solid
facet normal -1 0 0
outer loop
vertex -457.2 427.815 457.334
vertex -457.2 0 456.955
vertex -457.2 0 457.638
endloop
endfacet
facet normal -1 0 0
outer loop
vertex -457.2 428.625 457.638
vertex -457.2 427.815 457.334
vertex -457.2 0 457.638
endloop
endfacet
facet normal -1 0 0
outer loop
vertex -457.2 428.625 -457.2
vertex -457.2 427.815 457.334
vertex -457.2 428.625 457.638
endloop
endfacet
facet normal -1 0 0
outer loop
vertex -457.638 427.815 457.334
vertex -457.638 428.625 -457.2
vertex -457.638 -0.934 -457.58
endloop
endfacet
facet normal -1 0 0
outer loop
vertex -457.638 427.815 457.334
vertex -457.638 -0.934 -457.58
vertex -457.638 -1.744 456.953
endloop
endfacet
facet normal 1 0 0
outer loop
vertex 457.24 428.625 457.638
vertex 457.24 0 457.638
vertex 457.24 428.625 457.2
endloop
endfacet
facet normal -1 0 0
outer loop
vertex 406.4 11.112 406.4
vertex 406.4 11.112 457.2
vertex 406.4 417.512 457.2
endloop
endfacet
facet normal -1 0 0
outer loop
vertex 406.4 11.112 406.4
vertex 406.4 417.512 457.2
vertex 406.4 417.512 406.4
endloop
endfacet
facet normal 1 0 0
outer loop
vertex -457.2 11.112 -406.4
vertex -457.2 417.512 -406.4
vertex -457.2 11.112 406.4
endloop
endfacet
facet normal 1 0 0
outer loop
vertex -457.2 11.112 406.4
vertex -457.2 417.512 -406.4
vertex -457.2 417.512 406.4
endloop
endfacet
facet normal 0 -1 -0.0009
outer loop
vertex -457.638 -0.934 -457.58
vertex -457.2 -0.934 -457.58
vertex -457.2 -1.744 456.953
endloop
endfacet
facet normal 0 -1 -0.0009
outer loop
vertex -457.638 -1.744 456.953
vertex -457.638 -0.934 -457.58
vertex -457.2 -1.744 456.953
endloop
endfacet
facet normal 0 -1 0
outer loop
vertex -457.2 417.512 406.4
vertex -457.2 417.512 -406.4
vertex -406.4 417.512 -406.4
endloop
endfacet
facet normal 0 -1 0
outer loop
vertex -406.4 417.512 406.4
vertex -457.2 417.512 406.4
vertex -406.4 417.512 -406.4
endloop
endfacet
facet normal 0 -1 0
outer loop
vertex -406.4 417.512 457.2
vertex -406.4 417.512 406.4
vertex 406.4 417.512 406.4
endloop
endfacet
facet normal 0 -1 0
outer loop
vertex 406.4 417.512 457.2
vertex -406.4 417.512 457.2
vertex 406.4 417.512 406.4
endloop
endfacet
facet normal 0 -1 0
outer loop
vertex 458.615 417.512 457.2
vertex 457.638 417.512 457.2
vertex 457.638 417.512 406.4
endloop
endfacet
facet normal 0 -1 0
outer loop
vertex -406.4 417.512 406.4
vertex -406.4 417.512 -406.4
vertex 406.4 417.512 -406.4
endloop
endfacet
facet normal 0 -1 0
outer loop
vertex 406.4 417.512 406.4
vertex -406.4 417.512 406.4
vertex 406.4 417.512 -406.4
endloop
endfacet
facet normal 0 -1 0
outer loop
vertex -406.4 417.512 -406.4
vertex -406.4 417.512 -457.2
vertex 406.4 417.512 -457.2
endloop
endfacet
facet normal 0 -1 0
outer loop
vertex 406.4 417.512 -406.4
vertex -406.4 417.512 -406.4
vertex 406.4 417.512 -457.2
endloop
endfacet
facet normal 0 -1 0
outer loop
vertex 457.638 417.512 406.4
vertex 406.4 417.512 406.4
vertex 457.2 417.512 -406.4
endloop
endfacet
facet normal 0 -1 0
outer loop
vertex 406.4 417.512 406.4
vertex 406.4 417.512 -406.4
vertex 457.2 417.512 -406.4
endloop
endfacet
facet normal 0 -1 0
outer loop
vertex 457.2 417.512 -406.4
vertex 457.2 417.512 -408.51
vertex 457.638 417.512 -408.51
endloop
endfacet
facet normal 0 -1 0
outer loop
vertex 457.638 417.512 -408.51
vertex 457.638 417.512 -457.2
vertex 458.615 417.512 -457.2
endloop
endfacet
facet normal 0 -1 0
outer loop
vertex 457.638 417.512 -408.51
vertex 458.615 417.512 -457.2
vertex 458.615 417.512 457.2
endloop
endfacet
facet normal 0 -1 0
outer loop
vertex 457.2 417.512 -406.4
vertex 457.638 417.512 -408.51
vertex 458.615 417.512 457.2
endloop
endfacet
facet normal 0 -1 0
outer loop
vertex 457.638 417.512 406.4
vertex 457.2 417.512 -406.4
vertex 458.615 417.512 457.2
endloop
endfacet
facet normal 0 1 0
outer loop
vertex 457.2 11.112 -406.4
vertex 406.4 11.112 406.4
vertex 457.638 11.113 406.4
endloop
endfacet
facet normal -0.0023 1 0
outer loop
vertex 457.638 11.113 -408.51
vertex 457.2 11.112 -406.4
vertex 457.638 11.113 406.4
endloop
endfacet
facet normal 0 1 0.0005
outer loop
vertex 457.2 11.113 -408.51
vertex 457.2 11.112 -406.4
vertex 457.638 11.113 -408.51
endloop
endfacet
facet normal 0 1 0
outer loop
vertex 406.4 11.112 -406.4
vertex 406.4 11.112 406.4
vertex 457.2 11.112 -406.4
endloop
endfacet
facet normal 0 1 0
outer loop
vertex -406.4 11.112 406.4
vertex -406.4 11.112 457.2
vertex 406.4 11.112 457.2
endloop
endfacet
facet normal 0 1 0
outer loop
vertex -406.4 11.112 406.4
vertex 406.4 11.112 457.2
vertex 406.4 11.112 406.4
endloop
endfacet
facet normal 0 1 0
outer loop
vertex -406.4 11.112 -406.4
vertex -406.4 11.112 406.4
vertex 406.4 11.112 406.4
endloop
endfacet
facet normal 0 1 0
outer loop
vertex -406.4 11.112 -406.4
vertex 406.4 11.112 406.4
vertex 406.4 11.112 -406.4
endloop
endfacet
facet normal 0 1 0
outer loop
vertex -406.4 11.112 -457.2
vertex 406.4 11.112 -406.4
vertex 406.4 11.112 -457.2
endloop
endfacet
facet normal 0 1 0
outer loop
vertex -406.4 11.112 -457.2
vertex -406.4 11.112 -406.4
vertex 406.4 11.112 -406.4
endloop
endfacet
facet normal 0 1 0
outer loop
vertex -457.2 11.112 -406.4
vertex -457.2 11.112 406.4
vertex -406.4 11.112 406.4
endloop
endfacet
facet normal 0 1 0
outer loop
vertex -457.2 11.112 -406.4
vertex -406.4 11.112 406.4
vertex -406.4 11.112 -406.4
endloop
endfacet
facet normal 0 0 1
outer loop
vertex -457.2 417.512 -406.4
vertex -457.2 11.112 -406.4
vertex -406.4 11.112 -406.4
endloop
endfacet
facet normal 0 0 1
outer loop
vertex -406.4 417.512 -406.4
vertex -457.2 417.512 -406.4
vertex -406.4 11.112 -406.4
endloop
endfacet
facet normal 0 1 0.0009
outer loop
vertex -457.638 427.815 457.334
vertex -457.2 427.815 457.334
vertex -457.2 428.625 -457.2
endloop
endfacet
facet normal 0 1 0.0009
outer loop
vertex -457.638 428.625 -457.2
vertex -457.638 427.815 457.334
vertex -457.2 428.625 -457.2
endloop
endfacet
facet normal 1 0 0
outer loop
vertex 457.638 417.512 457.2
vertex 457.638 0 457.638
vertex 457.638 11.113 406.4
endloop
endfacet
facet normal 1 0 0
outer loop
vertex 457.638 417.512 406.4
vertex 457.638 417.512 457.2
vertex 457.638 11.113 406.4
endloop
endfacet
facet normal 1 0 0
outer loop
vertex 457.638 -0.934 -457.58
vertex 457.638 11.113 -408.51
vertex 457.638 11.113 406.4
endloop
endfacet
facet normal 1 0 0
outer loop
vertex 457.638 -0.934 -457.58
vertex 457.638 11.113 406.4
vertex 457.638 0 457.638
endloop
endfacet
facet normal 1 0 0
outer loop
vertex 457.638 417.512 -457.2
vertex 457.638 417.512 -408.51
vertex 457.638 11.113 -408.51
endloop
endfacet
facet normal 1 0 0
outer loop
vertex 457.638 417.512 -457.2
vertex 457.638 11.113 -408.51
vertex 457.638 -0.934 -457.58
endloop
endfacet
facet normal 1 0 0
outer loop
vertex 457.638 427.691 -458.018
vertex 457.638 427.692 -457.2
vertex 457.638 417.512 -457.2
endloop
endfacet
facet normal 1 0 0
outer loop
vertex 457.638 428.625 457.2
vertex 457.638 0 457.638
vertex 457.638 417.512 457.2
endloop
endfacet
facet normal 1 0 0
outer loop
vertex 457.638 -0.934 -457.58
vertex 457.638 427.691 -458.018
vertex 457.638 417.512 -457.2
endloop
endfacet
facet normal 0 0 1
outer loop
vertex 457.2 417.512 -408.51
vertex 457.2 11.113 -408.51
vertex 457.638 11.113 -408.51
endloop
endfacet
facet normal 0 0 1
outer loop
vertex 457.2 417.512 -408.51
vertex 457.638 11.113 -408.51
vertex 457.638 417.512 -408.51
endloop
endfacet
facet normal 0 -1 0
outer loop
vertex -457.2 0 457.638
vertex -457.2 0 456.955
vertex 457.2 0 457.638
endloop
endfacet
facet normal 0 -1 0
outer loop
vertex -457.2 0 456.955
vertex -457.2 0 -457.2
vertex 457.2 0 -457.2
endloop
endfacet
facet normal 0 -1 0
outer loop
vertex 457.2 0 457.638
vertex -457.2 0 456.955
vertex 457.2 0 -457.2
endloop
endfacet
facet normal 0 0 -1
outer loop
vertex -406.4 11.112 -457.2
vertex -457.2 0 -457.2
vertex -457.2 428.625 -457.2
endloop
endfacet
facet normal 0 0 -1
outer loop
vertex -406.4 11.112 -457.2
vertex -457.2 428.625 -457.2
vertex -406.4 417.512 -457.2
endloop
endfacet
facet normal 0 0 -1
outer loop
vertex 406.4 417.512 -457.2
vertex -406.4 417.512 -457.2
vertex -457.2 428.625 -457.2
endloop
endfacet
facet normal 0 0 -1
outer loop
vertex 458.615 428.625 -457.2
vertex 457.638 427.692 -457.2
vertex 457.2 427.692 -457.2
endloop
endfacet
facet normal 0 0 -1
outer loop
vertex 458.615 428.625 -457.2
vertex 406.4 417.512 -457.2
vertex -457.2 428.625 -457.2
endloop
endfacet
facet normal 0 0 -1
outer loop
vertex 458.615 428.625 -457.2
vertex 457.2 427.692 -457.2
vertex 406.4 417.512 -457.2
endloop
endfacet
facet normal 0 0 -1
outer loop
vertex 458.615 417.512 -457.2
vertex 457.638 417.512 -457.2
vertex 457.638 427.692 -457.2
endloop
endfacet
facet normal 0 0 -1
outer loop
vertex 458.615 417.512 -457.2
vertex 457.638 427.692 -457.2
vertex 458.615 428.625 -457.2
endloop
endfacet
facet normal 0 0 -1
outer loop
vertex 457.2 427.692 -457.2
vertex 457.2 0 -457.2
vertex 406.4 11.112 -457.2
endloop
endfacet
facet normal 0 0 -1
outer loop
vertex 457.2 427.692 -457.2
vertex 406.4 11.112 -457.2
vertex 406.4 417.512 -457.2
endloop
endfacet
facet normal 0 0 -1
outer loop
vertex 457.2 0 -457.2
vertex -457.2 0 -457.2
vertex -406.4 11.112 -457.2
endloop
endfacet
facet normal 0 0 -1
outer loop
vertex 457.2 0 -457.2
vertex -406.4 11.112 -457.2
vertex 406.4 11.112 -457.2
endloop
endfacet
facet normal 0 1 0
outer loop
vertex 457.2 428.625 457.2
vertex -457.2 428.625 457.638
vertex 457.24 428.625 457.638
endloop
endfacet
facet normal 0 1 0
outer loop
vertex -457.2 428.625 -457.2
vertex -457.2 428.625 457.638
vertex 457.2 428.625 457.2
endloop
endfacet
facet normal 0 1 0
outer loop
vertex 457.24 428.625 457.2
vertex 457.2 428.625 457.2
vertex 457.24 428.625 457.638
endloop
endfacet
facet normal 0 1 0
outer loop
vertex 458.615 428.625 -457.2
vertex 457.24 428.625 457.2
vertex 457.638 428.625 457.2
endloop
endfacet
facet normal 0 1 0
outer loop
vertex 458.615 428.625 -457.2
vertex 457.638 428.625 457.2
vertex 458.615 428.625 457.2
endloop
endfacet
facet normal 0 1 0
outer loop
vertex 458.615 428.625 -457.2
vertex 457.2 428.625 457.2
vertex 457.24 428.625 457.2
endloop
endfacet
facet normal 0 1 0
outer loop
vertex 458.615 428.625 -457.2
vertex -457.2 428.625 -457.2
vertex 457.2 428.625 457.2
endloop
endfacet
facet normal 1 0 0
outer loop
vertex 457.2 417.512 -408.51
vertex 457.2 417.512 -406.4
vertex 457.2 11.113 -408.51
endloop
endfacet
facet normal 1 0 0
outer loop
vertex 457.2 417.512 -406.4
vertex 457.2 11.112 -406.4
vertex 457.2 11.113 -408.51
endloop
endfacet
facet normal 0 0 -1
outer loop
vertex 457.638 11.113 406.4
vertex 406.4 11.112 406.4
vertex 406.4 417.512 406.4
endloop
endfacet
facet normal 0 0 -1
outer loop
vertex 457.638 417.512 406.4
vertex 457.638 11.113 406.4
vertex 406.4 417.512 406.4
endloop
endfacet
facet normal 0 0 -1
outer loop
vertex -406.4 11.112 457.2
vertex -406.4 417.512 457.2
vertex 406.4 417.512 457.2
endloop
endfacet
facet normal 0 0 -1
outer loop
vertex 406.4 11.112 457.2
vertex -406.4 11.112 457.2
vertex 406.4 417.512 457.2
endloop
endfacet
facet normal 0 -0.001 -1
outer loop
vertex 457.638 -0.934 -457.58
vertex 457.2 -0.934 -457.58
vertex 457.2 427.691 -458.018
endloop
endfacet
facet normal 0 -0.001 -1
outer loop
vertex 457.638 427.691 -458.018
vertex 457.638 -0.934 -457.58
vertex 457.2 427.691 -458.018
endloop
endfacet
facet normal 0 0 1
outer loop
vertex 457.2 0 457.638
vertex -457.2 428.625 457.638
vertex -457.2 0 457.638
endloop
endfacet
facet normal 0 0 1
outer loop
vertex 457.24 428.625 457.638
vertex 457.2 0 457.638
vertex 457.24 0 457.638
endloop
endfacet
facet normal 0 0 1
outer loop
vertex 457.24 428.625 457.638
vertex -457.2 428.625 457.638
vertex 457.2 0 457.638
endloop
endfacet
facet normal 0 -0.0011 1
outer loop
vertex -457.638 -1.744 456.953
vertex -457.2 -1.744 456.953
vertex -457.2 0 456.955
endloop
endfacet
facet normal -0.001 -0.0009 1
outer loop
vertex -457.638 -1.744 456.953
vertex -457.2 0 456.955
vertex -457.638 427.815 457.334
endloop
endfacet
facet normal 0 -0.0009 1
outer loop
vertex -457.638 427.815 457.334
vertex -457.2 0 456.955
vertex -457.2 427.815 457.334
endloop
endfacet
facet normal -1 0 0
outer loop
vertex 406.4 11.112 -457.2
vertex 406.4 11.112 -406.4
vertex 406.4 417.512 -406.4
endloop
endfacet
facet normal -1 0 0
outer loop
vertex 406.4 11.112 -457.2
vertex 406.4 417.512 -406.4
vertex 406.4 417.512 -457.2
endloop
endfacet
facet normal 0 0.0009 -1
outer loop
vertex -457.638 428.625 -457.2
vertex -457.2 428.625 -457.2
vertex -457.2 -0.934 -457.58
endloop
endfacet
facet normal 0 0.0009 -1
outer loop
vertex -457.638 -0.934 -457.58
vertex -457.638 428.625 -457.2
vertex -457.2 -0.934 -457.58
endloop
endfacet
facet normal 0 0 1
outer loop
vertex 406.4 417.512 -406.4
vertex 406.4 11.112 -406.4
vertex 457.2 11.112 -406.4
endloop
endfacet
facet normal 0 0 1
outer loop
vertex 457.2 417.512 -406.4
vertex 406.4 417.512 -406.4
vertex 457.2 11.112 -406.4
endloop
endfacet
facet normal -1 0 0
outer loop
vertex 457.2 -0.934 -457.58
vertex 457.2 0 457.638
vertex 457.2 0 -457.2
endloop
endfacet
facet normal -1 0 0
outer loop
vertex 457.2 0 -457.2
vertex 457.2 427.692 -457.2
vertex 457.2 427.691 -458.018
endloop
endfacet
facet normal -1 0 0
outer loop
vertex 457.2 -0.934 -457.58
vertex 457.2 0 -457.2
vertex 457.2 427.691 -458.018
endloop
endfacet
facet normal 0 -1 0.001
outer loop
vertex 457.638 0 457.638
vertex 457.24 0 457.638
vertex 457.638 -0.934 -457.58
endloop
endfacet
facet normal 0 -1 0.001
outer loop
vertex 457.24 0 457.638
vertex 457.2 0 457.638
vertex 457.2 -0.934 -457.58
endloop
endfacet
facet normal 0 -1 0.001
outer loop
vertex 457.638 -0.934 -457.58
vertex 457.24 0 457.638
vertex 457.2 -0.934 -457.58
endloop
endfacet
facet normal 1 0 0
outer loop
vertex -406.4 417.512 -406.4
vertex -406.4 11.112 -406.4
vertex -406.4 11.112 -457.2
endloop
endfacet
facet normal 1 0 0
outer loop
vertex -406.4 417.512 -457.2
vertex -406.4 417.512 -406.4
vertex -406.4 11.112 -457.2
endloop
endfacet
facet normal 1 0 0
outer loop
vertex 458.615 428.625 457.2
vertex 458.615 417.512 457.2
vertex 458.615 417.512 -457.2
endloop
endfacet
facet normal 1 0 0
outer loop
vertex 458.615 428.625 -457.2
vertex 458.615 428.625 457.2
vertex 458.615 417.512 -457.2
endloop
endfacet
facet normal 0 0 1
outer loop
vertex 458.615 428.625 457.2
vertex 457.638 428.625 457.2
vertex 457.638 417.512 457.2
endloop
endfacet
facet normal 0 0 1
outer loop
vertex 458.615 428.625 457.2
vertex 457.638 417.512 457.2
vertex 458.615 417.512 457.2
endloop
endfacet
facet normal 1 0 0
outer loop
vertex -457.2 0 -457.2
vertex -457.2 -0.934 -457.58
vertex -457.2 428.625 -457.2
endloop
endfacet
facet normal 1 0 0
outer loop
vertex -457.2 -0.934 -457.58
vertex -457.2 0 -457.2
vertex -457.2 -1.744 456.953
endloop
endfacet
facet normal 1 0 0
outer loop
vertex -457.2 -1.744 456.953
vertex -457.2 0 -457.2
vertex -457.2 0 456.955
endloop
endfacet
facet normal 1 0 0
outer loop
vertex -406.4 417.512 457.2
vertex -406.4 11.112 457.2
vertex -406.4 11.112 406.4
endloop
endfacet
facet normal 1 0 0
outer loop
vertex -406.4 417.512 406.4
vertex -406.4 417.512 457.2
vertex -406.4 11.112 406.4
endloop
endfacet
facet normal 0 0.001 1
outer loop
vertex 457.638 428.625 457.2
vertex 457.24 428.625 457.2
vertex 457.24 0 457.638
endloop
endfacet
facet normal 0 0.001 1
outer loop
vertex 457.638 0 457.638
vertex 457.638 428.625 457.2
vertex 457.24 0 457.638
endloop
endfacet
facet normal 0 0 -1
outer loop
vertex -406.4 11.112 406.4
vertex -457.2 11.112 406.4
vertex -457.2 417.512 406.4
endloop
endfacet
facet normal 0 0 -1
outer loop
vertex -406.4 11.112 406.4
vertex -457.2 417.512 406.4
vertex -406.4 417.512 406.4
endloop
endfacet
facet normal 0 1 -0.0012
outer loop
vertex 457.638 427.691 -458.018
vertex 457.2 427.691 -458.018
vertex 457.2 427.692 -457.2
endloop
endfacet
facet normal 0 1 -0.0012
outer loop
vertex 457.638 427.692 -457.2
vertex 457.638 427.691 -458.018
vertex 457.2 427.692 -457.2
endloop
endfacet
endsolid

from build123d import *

# Parameters (mm, degrees)
BOSS_EXTRUDE1_DEPTH  = 11.1125
SKETCH1_5_W          = 50.8
SKETCH1_5_H          = 50.8
BOSS_EXTRUDE3_DEPTH  = 417.5125
SKETCH1_6_W          = 50.8
SKETCH1_6_H          = 50.8
BOSS_EXTRUDE4_DEPTH  = 417.5125
SKETCH1_7_W          = 50.8
SKETCH1_7_H          = 50.8
BOSS_EXTRUDE5_DEPTH  = 417.5125
SKETCH1_8_W          = 50.8
SKETCH1_8_H          = 50.8
BOSS_EXTRUDE6_DEPTH  = 417.5125
SKETCH2_W            = 915.815141898
SKETCH2_H            = 914.4
BOSS_EXTRUDE8_DEPTH  = 11.1125
SKETCH3_W            = 914.440346881
SKETCH3_H            = 428.625
BOSS_EXTRUDE9_DEPTH  = 0.4375
SKETCH4_W            = 814.910119316
SKETCH4_H            = 406.4
BOSS_EXTRUDE13_DEPTH = 0.4375
BOSS_EXTRUDE21_DEPTH = 0.4375


with BuildPart() as part:
    # Sketch1 → Boss-Extrude1 (new body)
    with BuildSketch(Plane(origin=(0, 0, 0), x_dir=(1, 0, 0), z_dir=(0, 1, 0))):
        Polygon((-406.4, 406.4), (-457.2, 406.4), (-457.2, -406.4), (-406.4, -406.4), (-406.4, -457.2), (406.4, -457.2), (406.4, -406.4), (457.2, -406.4), (457.2, 406.4), (406.4, 406.4), (406.4, 457.2), (-406.4, 457.2), align=None)
    extrude(amount=BOSS_EXTRUDE1_DEPTH)

    # Sketch1<5> → Boss-Extrude3 (add)
    with BuildSketch(Plane(origin=(0, 0, 0), x_dir=(1, 0, 0), z_dir=(0, 1, 0))):
        with Locations((431.8, -431.8)):
            Rectangle(SKETCH1_5_W, SKETCH1_5_H)
    extrude(amount=BOSS_EXTRUDE3_DEPTH)

    # Sketch1<6> → Boss-Extrude4 (add)
    with BuildSketch(Plane(origin=(0, 0, 0), x_dir=(1, 0, 0), z_dir=(0, 1, 0))):
        with Locations((-431.8, -431.8)):
            Rectangle(SKETCH1_6_W, SKETCH1_6_H)
    extrude(amount=BOSS_EXTRUDE4_DEPTH)

    # Sketch1<7> → Boss-Extrude5 (add)
    with BuildSketch(Plane(origin=(0, 0, 0), x_dir=(1, 0, 0), z_dir=(0, 1, 0))):
        with Locations((431.8, 431.8)):
            Rectangle(SKETCH1_7_W, SKETCH1_7_H)
    extrude(amount=BOSS_EXTRUDE5_DEPTH)

    # Sketch1<8> → Boss-Extrude6 (add)
    with BuildSketch(Plane(origin=(0, 0, 0), x_dir=(1, 0, 0), z_dir=(0, 1, 0))):
        with Locations((-431.8, 431.8)):
            Rectangle(SKETCH1_8_W, SKETCH1_8_H)
    extrude(amount=BOSS_EXTRUDE6_DEPTH)

    # Sketch2 → Boss-Extrude8 (add)
    with BuildSketch(Plane(origin=(0, 417.5125, 0), x_dir=(1, 0, 0), z_dir=(0, 1, 0))):
        with Locations((0.707570949, 0)):
            Rectangle(SKETCH2_W, SKETCH2_H)
    extrude(amount=BOSS_EXTRUDE8_DEPTH)

    # Sketch3 → Boss-Extrude9 (add)
    with BuildSketch(Plane.XY.offset(457.2)):
        with Locations((0.020173441, 214.3125)):
            Rectangle(SKETCH3_W, SKETCH3_H)
    extrude(amount=BOSS_EXTRUDE9_DEPTH)

    # Sketch4 → Boss-Extrude13 (add)
    with BuildSketch(Plane(origin=(457.2, 0, 0), x_dir=(0, 0, -1), z_dir=(1, 0, 0))):
        Polygon((-457.2, 428.625), (-457.6375, 0), (457.580376967, -0.934168145), (458.017876967, 427.690831855), align=None)
        with Locations((1.055059658, 214.3125)):
            Rectangle(SKETCH4_W, SKETCH4_H, mode=Mode.SUBTRACT)
    extrude(amount=BOSS_EXTRUDE13_DEPTH)

    # Sketch10 → Boss-Extrude21 (add)
    with BuildSketch(Plane.ZY.offset(457.2)):
        Polygon((-457.2, 428.625), (-457.580376967, -0.934168145), (456.953407178, -1.743992758), (457.333784145, 427.815175387), align=None)
    extrude(amount=BOSS_EXTRUDE21_DEPTH)


solid = part.part
